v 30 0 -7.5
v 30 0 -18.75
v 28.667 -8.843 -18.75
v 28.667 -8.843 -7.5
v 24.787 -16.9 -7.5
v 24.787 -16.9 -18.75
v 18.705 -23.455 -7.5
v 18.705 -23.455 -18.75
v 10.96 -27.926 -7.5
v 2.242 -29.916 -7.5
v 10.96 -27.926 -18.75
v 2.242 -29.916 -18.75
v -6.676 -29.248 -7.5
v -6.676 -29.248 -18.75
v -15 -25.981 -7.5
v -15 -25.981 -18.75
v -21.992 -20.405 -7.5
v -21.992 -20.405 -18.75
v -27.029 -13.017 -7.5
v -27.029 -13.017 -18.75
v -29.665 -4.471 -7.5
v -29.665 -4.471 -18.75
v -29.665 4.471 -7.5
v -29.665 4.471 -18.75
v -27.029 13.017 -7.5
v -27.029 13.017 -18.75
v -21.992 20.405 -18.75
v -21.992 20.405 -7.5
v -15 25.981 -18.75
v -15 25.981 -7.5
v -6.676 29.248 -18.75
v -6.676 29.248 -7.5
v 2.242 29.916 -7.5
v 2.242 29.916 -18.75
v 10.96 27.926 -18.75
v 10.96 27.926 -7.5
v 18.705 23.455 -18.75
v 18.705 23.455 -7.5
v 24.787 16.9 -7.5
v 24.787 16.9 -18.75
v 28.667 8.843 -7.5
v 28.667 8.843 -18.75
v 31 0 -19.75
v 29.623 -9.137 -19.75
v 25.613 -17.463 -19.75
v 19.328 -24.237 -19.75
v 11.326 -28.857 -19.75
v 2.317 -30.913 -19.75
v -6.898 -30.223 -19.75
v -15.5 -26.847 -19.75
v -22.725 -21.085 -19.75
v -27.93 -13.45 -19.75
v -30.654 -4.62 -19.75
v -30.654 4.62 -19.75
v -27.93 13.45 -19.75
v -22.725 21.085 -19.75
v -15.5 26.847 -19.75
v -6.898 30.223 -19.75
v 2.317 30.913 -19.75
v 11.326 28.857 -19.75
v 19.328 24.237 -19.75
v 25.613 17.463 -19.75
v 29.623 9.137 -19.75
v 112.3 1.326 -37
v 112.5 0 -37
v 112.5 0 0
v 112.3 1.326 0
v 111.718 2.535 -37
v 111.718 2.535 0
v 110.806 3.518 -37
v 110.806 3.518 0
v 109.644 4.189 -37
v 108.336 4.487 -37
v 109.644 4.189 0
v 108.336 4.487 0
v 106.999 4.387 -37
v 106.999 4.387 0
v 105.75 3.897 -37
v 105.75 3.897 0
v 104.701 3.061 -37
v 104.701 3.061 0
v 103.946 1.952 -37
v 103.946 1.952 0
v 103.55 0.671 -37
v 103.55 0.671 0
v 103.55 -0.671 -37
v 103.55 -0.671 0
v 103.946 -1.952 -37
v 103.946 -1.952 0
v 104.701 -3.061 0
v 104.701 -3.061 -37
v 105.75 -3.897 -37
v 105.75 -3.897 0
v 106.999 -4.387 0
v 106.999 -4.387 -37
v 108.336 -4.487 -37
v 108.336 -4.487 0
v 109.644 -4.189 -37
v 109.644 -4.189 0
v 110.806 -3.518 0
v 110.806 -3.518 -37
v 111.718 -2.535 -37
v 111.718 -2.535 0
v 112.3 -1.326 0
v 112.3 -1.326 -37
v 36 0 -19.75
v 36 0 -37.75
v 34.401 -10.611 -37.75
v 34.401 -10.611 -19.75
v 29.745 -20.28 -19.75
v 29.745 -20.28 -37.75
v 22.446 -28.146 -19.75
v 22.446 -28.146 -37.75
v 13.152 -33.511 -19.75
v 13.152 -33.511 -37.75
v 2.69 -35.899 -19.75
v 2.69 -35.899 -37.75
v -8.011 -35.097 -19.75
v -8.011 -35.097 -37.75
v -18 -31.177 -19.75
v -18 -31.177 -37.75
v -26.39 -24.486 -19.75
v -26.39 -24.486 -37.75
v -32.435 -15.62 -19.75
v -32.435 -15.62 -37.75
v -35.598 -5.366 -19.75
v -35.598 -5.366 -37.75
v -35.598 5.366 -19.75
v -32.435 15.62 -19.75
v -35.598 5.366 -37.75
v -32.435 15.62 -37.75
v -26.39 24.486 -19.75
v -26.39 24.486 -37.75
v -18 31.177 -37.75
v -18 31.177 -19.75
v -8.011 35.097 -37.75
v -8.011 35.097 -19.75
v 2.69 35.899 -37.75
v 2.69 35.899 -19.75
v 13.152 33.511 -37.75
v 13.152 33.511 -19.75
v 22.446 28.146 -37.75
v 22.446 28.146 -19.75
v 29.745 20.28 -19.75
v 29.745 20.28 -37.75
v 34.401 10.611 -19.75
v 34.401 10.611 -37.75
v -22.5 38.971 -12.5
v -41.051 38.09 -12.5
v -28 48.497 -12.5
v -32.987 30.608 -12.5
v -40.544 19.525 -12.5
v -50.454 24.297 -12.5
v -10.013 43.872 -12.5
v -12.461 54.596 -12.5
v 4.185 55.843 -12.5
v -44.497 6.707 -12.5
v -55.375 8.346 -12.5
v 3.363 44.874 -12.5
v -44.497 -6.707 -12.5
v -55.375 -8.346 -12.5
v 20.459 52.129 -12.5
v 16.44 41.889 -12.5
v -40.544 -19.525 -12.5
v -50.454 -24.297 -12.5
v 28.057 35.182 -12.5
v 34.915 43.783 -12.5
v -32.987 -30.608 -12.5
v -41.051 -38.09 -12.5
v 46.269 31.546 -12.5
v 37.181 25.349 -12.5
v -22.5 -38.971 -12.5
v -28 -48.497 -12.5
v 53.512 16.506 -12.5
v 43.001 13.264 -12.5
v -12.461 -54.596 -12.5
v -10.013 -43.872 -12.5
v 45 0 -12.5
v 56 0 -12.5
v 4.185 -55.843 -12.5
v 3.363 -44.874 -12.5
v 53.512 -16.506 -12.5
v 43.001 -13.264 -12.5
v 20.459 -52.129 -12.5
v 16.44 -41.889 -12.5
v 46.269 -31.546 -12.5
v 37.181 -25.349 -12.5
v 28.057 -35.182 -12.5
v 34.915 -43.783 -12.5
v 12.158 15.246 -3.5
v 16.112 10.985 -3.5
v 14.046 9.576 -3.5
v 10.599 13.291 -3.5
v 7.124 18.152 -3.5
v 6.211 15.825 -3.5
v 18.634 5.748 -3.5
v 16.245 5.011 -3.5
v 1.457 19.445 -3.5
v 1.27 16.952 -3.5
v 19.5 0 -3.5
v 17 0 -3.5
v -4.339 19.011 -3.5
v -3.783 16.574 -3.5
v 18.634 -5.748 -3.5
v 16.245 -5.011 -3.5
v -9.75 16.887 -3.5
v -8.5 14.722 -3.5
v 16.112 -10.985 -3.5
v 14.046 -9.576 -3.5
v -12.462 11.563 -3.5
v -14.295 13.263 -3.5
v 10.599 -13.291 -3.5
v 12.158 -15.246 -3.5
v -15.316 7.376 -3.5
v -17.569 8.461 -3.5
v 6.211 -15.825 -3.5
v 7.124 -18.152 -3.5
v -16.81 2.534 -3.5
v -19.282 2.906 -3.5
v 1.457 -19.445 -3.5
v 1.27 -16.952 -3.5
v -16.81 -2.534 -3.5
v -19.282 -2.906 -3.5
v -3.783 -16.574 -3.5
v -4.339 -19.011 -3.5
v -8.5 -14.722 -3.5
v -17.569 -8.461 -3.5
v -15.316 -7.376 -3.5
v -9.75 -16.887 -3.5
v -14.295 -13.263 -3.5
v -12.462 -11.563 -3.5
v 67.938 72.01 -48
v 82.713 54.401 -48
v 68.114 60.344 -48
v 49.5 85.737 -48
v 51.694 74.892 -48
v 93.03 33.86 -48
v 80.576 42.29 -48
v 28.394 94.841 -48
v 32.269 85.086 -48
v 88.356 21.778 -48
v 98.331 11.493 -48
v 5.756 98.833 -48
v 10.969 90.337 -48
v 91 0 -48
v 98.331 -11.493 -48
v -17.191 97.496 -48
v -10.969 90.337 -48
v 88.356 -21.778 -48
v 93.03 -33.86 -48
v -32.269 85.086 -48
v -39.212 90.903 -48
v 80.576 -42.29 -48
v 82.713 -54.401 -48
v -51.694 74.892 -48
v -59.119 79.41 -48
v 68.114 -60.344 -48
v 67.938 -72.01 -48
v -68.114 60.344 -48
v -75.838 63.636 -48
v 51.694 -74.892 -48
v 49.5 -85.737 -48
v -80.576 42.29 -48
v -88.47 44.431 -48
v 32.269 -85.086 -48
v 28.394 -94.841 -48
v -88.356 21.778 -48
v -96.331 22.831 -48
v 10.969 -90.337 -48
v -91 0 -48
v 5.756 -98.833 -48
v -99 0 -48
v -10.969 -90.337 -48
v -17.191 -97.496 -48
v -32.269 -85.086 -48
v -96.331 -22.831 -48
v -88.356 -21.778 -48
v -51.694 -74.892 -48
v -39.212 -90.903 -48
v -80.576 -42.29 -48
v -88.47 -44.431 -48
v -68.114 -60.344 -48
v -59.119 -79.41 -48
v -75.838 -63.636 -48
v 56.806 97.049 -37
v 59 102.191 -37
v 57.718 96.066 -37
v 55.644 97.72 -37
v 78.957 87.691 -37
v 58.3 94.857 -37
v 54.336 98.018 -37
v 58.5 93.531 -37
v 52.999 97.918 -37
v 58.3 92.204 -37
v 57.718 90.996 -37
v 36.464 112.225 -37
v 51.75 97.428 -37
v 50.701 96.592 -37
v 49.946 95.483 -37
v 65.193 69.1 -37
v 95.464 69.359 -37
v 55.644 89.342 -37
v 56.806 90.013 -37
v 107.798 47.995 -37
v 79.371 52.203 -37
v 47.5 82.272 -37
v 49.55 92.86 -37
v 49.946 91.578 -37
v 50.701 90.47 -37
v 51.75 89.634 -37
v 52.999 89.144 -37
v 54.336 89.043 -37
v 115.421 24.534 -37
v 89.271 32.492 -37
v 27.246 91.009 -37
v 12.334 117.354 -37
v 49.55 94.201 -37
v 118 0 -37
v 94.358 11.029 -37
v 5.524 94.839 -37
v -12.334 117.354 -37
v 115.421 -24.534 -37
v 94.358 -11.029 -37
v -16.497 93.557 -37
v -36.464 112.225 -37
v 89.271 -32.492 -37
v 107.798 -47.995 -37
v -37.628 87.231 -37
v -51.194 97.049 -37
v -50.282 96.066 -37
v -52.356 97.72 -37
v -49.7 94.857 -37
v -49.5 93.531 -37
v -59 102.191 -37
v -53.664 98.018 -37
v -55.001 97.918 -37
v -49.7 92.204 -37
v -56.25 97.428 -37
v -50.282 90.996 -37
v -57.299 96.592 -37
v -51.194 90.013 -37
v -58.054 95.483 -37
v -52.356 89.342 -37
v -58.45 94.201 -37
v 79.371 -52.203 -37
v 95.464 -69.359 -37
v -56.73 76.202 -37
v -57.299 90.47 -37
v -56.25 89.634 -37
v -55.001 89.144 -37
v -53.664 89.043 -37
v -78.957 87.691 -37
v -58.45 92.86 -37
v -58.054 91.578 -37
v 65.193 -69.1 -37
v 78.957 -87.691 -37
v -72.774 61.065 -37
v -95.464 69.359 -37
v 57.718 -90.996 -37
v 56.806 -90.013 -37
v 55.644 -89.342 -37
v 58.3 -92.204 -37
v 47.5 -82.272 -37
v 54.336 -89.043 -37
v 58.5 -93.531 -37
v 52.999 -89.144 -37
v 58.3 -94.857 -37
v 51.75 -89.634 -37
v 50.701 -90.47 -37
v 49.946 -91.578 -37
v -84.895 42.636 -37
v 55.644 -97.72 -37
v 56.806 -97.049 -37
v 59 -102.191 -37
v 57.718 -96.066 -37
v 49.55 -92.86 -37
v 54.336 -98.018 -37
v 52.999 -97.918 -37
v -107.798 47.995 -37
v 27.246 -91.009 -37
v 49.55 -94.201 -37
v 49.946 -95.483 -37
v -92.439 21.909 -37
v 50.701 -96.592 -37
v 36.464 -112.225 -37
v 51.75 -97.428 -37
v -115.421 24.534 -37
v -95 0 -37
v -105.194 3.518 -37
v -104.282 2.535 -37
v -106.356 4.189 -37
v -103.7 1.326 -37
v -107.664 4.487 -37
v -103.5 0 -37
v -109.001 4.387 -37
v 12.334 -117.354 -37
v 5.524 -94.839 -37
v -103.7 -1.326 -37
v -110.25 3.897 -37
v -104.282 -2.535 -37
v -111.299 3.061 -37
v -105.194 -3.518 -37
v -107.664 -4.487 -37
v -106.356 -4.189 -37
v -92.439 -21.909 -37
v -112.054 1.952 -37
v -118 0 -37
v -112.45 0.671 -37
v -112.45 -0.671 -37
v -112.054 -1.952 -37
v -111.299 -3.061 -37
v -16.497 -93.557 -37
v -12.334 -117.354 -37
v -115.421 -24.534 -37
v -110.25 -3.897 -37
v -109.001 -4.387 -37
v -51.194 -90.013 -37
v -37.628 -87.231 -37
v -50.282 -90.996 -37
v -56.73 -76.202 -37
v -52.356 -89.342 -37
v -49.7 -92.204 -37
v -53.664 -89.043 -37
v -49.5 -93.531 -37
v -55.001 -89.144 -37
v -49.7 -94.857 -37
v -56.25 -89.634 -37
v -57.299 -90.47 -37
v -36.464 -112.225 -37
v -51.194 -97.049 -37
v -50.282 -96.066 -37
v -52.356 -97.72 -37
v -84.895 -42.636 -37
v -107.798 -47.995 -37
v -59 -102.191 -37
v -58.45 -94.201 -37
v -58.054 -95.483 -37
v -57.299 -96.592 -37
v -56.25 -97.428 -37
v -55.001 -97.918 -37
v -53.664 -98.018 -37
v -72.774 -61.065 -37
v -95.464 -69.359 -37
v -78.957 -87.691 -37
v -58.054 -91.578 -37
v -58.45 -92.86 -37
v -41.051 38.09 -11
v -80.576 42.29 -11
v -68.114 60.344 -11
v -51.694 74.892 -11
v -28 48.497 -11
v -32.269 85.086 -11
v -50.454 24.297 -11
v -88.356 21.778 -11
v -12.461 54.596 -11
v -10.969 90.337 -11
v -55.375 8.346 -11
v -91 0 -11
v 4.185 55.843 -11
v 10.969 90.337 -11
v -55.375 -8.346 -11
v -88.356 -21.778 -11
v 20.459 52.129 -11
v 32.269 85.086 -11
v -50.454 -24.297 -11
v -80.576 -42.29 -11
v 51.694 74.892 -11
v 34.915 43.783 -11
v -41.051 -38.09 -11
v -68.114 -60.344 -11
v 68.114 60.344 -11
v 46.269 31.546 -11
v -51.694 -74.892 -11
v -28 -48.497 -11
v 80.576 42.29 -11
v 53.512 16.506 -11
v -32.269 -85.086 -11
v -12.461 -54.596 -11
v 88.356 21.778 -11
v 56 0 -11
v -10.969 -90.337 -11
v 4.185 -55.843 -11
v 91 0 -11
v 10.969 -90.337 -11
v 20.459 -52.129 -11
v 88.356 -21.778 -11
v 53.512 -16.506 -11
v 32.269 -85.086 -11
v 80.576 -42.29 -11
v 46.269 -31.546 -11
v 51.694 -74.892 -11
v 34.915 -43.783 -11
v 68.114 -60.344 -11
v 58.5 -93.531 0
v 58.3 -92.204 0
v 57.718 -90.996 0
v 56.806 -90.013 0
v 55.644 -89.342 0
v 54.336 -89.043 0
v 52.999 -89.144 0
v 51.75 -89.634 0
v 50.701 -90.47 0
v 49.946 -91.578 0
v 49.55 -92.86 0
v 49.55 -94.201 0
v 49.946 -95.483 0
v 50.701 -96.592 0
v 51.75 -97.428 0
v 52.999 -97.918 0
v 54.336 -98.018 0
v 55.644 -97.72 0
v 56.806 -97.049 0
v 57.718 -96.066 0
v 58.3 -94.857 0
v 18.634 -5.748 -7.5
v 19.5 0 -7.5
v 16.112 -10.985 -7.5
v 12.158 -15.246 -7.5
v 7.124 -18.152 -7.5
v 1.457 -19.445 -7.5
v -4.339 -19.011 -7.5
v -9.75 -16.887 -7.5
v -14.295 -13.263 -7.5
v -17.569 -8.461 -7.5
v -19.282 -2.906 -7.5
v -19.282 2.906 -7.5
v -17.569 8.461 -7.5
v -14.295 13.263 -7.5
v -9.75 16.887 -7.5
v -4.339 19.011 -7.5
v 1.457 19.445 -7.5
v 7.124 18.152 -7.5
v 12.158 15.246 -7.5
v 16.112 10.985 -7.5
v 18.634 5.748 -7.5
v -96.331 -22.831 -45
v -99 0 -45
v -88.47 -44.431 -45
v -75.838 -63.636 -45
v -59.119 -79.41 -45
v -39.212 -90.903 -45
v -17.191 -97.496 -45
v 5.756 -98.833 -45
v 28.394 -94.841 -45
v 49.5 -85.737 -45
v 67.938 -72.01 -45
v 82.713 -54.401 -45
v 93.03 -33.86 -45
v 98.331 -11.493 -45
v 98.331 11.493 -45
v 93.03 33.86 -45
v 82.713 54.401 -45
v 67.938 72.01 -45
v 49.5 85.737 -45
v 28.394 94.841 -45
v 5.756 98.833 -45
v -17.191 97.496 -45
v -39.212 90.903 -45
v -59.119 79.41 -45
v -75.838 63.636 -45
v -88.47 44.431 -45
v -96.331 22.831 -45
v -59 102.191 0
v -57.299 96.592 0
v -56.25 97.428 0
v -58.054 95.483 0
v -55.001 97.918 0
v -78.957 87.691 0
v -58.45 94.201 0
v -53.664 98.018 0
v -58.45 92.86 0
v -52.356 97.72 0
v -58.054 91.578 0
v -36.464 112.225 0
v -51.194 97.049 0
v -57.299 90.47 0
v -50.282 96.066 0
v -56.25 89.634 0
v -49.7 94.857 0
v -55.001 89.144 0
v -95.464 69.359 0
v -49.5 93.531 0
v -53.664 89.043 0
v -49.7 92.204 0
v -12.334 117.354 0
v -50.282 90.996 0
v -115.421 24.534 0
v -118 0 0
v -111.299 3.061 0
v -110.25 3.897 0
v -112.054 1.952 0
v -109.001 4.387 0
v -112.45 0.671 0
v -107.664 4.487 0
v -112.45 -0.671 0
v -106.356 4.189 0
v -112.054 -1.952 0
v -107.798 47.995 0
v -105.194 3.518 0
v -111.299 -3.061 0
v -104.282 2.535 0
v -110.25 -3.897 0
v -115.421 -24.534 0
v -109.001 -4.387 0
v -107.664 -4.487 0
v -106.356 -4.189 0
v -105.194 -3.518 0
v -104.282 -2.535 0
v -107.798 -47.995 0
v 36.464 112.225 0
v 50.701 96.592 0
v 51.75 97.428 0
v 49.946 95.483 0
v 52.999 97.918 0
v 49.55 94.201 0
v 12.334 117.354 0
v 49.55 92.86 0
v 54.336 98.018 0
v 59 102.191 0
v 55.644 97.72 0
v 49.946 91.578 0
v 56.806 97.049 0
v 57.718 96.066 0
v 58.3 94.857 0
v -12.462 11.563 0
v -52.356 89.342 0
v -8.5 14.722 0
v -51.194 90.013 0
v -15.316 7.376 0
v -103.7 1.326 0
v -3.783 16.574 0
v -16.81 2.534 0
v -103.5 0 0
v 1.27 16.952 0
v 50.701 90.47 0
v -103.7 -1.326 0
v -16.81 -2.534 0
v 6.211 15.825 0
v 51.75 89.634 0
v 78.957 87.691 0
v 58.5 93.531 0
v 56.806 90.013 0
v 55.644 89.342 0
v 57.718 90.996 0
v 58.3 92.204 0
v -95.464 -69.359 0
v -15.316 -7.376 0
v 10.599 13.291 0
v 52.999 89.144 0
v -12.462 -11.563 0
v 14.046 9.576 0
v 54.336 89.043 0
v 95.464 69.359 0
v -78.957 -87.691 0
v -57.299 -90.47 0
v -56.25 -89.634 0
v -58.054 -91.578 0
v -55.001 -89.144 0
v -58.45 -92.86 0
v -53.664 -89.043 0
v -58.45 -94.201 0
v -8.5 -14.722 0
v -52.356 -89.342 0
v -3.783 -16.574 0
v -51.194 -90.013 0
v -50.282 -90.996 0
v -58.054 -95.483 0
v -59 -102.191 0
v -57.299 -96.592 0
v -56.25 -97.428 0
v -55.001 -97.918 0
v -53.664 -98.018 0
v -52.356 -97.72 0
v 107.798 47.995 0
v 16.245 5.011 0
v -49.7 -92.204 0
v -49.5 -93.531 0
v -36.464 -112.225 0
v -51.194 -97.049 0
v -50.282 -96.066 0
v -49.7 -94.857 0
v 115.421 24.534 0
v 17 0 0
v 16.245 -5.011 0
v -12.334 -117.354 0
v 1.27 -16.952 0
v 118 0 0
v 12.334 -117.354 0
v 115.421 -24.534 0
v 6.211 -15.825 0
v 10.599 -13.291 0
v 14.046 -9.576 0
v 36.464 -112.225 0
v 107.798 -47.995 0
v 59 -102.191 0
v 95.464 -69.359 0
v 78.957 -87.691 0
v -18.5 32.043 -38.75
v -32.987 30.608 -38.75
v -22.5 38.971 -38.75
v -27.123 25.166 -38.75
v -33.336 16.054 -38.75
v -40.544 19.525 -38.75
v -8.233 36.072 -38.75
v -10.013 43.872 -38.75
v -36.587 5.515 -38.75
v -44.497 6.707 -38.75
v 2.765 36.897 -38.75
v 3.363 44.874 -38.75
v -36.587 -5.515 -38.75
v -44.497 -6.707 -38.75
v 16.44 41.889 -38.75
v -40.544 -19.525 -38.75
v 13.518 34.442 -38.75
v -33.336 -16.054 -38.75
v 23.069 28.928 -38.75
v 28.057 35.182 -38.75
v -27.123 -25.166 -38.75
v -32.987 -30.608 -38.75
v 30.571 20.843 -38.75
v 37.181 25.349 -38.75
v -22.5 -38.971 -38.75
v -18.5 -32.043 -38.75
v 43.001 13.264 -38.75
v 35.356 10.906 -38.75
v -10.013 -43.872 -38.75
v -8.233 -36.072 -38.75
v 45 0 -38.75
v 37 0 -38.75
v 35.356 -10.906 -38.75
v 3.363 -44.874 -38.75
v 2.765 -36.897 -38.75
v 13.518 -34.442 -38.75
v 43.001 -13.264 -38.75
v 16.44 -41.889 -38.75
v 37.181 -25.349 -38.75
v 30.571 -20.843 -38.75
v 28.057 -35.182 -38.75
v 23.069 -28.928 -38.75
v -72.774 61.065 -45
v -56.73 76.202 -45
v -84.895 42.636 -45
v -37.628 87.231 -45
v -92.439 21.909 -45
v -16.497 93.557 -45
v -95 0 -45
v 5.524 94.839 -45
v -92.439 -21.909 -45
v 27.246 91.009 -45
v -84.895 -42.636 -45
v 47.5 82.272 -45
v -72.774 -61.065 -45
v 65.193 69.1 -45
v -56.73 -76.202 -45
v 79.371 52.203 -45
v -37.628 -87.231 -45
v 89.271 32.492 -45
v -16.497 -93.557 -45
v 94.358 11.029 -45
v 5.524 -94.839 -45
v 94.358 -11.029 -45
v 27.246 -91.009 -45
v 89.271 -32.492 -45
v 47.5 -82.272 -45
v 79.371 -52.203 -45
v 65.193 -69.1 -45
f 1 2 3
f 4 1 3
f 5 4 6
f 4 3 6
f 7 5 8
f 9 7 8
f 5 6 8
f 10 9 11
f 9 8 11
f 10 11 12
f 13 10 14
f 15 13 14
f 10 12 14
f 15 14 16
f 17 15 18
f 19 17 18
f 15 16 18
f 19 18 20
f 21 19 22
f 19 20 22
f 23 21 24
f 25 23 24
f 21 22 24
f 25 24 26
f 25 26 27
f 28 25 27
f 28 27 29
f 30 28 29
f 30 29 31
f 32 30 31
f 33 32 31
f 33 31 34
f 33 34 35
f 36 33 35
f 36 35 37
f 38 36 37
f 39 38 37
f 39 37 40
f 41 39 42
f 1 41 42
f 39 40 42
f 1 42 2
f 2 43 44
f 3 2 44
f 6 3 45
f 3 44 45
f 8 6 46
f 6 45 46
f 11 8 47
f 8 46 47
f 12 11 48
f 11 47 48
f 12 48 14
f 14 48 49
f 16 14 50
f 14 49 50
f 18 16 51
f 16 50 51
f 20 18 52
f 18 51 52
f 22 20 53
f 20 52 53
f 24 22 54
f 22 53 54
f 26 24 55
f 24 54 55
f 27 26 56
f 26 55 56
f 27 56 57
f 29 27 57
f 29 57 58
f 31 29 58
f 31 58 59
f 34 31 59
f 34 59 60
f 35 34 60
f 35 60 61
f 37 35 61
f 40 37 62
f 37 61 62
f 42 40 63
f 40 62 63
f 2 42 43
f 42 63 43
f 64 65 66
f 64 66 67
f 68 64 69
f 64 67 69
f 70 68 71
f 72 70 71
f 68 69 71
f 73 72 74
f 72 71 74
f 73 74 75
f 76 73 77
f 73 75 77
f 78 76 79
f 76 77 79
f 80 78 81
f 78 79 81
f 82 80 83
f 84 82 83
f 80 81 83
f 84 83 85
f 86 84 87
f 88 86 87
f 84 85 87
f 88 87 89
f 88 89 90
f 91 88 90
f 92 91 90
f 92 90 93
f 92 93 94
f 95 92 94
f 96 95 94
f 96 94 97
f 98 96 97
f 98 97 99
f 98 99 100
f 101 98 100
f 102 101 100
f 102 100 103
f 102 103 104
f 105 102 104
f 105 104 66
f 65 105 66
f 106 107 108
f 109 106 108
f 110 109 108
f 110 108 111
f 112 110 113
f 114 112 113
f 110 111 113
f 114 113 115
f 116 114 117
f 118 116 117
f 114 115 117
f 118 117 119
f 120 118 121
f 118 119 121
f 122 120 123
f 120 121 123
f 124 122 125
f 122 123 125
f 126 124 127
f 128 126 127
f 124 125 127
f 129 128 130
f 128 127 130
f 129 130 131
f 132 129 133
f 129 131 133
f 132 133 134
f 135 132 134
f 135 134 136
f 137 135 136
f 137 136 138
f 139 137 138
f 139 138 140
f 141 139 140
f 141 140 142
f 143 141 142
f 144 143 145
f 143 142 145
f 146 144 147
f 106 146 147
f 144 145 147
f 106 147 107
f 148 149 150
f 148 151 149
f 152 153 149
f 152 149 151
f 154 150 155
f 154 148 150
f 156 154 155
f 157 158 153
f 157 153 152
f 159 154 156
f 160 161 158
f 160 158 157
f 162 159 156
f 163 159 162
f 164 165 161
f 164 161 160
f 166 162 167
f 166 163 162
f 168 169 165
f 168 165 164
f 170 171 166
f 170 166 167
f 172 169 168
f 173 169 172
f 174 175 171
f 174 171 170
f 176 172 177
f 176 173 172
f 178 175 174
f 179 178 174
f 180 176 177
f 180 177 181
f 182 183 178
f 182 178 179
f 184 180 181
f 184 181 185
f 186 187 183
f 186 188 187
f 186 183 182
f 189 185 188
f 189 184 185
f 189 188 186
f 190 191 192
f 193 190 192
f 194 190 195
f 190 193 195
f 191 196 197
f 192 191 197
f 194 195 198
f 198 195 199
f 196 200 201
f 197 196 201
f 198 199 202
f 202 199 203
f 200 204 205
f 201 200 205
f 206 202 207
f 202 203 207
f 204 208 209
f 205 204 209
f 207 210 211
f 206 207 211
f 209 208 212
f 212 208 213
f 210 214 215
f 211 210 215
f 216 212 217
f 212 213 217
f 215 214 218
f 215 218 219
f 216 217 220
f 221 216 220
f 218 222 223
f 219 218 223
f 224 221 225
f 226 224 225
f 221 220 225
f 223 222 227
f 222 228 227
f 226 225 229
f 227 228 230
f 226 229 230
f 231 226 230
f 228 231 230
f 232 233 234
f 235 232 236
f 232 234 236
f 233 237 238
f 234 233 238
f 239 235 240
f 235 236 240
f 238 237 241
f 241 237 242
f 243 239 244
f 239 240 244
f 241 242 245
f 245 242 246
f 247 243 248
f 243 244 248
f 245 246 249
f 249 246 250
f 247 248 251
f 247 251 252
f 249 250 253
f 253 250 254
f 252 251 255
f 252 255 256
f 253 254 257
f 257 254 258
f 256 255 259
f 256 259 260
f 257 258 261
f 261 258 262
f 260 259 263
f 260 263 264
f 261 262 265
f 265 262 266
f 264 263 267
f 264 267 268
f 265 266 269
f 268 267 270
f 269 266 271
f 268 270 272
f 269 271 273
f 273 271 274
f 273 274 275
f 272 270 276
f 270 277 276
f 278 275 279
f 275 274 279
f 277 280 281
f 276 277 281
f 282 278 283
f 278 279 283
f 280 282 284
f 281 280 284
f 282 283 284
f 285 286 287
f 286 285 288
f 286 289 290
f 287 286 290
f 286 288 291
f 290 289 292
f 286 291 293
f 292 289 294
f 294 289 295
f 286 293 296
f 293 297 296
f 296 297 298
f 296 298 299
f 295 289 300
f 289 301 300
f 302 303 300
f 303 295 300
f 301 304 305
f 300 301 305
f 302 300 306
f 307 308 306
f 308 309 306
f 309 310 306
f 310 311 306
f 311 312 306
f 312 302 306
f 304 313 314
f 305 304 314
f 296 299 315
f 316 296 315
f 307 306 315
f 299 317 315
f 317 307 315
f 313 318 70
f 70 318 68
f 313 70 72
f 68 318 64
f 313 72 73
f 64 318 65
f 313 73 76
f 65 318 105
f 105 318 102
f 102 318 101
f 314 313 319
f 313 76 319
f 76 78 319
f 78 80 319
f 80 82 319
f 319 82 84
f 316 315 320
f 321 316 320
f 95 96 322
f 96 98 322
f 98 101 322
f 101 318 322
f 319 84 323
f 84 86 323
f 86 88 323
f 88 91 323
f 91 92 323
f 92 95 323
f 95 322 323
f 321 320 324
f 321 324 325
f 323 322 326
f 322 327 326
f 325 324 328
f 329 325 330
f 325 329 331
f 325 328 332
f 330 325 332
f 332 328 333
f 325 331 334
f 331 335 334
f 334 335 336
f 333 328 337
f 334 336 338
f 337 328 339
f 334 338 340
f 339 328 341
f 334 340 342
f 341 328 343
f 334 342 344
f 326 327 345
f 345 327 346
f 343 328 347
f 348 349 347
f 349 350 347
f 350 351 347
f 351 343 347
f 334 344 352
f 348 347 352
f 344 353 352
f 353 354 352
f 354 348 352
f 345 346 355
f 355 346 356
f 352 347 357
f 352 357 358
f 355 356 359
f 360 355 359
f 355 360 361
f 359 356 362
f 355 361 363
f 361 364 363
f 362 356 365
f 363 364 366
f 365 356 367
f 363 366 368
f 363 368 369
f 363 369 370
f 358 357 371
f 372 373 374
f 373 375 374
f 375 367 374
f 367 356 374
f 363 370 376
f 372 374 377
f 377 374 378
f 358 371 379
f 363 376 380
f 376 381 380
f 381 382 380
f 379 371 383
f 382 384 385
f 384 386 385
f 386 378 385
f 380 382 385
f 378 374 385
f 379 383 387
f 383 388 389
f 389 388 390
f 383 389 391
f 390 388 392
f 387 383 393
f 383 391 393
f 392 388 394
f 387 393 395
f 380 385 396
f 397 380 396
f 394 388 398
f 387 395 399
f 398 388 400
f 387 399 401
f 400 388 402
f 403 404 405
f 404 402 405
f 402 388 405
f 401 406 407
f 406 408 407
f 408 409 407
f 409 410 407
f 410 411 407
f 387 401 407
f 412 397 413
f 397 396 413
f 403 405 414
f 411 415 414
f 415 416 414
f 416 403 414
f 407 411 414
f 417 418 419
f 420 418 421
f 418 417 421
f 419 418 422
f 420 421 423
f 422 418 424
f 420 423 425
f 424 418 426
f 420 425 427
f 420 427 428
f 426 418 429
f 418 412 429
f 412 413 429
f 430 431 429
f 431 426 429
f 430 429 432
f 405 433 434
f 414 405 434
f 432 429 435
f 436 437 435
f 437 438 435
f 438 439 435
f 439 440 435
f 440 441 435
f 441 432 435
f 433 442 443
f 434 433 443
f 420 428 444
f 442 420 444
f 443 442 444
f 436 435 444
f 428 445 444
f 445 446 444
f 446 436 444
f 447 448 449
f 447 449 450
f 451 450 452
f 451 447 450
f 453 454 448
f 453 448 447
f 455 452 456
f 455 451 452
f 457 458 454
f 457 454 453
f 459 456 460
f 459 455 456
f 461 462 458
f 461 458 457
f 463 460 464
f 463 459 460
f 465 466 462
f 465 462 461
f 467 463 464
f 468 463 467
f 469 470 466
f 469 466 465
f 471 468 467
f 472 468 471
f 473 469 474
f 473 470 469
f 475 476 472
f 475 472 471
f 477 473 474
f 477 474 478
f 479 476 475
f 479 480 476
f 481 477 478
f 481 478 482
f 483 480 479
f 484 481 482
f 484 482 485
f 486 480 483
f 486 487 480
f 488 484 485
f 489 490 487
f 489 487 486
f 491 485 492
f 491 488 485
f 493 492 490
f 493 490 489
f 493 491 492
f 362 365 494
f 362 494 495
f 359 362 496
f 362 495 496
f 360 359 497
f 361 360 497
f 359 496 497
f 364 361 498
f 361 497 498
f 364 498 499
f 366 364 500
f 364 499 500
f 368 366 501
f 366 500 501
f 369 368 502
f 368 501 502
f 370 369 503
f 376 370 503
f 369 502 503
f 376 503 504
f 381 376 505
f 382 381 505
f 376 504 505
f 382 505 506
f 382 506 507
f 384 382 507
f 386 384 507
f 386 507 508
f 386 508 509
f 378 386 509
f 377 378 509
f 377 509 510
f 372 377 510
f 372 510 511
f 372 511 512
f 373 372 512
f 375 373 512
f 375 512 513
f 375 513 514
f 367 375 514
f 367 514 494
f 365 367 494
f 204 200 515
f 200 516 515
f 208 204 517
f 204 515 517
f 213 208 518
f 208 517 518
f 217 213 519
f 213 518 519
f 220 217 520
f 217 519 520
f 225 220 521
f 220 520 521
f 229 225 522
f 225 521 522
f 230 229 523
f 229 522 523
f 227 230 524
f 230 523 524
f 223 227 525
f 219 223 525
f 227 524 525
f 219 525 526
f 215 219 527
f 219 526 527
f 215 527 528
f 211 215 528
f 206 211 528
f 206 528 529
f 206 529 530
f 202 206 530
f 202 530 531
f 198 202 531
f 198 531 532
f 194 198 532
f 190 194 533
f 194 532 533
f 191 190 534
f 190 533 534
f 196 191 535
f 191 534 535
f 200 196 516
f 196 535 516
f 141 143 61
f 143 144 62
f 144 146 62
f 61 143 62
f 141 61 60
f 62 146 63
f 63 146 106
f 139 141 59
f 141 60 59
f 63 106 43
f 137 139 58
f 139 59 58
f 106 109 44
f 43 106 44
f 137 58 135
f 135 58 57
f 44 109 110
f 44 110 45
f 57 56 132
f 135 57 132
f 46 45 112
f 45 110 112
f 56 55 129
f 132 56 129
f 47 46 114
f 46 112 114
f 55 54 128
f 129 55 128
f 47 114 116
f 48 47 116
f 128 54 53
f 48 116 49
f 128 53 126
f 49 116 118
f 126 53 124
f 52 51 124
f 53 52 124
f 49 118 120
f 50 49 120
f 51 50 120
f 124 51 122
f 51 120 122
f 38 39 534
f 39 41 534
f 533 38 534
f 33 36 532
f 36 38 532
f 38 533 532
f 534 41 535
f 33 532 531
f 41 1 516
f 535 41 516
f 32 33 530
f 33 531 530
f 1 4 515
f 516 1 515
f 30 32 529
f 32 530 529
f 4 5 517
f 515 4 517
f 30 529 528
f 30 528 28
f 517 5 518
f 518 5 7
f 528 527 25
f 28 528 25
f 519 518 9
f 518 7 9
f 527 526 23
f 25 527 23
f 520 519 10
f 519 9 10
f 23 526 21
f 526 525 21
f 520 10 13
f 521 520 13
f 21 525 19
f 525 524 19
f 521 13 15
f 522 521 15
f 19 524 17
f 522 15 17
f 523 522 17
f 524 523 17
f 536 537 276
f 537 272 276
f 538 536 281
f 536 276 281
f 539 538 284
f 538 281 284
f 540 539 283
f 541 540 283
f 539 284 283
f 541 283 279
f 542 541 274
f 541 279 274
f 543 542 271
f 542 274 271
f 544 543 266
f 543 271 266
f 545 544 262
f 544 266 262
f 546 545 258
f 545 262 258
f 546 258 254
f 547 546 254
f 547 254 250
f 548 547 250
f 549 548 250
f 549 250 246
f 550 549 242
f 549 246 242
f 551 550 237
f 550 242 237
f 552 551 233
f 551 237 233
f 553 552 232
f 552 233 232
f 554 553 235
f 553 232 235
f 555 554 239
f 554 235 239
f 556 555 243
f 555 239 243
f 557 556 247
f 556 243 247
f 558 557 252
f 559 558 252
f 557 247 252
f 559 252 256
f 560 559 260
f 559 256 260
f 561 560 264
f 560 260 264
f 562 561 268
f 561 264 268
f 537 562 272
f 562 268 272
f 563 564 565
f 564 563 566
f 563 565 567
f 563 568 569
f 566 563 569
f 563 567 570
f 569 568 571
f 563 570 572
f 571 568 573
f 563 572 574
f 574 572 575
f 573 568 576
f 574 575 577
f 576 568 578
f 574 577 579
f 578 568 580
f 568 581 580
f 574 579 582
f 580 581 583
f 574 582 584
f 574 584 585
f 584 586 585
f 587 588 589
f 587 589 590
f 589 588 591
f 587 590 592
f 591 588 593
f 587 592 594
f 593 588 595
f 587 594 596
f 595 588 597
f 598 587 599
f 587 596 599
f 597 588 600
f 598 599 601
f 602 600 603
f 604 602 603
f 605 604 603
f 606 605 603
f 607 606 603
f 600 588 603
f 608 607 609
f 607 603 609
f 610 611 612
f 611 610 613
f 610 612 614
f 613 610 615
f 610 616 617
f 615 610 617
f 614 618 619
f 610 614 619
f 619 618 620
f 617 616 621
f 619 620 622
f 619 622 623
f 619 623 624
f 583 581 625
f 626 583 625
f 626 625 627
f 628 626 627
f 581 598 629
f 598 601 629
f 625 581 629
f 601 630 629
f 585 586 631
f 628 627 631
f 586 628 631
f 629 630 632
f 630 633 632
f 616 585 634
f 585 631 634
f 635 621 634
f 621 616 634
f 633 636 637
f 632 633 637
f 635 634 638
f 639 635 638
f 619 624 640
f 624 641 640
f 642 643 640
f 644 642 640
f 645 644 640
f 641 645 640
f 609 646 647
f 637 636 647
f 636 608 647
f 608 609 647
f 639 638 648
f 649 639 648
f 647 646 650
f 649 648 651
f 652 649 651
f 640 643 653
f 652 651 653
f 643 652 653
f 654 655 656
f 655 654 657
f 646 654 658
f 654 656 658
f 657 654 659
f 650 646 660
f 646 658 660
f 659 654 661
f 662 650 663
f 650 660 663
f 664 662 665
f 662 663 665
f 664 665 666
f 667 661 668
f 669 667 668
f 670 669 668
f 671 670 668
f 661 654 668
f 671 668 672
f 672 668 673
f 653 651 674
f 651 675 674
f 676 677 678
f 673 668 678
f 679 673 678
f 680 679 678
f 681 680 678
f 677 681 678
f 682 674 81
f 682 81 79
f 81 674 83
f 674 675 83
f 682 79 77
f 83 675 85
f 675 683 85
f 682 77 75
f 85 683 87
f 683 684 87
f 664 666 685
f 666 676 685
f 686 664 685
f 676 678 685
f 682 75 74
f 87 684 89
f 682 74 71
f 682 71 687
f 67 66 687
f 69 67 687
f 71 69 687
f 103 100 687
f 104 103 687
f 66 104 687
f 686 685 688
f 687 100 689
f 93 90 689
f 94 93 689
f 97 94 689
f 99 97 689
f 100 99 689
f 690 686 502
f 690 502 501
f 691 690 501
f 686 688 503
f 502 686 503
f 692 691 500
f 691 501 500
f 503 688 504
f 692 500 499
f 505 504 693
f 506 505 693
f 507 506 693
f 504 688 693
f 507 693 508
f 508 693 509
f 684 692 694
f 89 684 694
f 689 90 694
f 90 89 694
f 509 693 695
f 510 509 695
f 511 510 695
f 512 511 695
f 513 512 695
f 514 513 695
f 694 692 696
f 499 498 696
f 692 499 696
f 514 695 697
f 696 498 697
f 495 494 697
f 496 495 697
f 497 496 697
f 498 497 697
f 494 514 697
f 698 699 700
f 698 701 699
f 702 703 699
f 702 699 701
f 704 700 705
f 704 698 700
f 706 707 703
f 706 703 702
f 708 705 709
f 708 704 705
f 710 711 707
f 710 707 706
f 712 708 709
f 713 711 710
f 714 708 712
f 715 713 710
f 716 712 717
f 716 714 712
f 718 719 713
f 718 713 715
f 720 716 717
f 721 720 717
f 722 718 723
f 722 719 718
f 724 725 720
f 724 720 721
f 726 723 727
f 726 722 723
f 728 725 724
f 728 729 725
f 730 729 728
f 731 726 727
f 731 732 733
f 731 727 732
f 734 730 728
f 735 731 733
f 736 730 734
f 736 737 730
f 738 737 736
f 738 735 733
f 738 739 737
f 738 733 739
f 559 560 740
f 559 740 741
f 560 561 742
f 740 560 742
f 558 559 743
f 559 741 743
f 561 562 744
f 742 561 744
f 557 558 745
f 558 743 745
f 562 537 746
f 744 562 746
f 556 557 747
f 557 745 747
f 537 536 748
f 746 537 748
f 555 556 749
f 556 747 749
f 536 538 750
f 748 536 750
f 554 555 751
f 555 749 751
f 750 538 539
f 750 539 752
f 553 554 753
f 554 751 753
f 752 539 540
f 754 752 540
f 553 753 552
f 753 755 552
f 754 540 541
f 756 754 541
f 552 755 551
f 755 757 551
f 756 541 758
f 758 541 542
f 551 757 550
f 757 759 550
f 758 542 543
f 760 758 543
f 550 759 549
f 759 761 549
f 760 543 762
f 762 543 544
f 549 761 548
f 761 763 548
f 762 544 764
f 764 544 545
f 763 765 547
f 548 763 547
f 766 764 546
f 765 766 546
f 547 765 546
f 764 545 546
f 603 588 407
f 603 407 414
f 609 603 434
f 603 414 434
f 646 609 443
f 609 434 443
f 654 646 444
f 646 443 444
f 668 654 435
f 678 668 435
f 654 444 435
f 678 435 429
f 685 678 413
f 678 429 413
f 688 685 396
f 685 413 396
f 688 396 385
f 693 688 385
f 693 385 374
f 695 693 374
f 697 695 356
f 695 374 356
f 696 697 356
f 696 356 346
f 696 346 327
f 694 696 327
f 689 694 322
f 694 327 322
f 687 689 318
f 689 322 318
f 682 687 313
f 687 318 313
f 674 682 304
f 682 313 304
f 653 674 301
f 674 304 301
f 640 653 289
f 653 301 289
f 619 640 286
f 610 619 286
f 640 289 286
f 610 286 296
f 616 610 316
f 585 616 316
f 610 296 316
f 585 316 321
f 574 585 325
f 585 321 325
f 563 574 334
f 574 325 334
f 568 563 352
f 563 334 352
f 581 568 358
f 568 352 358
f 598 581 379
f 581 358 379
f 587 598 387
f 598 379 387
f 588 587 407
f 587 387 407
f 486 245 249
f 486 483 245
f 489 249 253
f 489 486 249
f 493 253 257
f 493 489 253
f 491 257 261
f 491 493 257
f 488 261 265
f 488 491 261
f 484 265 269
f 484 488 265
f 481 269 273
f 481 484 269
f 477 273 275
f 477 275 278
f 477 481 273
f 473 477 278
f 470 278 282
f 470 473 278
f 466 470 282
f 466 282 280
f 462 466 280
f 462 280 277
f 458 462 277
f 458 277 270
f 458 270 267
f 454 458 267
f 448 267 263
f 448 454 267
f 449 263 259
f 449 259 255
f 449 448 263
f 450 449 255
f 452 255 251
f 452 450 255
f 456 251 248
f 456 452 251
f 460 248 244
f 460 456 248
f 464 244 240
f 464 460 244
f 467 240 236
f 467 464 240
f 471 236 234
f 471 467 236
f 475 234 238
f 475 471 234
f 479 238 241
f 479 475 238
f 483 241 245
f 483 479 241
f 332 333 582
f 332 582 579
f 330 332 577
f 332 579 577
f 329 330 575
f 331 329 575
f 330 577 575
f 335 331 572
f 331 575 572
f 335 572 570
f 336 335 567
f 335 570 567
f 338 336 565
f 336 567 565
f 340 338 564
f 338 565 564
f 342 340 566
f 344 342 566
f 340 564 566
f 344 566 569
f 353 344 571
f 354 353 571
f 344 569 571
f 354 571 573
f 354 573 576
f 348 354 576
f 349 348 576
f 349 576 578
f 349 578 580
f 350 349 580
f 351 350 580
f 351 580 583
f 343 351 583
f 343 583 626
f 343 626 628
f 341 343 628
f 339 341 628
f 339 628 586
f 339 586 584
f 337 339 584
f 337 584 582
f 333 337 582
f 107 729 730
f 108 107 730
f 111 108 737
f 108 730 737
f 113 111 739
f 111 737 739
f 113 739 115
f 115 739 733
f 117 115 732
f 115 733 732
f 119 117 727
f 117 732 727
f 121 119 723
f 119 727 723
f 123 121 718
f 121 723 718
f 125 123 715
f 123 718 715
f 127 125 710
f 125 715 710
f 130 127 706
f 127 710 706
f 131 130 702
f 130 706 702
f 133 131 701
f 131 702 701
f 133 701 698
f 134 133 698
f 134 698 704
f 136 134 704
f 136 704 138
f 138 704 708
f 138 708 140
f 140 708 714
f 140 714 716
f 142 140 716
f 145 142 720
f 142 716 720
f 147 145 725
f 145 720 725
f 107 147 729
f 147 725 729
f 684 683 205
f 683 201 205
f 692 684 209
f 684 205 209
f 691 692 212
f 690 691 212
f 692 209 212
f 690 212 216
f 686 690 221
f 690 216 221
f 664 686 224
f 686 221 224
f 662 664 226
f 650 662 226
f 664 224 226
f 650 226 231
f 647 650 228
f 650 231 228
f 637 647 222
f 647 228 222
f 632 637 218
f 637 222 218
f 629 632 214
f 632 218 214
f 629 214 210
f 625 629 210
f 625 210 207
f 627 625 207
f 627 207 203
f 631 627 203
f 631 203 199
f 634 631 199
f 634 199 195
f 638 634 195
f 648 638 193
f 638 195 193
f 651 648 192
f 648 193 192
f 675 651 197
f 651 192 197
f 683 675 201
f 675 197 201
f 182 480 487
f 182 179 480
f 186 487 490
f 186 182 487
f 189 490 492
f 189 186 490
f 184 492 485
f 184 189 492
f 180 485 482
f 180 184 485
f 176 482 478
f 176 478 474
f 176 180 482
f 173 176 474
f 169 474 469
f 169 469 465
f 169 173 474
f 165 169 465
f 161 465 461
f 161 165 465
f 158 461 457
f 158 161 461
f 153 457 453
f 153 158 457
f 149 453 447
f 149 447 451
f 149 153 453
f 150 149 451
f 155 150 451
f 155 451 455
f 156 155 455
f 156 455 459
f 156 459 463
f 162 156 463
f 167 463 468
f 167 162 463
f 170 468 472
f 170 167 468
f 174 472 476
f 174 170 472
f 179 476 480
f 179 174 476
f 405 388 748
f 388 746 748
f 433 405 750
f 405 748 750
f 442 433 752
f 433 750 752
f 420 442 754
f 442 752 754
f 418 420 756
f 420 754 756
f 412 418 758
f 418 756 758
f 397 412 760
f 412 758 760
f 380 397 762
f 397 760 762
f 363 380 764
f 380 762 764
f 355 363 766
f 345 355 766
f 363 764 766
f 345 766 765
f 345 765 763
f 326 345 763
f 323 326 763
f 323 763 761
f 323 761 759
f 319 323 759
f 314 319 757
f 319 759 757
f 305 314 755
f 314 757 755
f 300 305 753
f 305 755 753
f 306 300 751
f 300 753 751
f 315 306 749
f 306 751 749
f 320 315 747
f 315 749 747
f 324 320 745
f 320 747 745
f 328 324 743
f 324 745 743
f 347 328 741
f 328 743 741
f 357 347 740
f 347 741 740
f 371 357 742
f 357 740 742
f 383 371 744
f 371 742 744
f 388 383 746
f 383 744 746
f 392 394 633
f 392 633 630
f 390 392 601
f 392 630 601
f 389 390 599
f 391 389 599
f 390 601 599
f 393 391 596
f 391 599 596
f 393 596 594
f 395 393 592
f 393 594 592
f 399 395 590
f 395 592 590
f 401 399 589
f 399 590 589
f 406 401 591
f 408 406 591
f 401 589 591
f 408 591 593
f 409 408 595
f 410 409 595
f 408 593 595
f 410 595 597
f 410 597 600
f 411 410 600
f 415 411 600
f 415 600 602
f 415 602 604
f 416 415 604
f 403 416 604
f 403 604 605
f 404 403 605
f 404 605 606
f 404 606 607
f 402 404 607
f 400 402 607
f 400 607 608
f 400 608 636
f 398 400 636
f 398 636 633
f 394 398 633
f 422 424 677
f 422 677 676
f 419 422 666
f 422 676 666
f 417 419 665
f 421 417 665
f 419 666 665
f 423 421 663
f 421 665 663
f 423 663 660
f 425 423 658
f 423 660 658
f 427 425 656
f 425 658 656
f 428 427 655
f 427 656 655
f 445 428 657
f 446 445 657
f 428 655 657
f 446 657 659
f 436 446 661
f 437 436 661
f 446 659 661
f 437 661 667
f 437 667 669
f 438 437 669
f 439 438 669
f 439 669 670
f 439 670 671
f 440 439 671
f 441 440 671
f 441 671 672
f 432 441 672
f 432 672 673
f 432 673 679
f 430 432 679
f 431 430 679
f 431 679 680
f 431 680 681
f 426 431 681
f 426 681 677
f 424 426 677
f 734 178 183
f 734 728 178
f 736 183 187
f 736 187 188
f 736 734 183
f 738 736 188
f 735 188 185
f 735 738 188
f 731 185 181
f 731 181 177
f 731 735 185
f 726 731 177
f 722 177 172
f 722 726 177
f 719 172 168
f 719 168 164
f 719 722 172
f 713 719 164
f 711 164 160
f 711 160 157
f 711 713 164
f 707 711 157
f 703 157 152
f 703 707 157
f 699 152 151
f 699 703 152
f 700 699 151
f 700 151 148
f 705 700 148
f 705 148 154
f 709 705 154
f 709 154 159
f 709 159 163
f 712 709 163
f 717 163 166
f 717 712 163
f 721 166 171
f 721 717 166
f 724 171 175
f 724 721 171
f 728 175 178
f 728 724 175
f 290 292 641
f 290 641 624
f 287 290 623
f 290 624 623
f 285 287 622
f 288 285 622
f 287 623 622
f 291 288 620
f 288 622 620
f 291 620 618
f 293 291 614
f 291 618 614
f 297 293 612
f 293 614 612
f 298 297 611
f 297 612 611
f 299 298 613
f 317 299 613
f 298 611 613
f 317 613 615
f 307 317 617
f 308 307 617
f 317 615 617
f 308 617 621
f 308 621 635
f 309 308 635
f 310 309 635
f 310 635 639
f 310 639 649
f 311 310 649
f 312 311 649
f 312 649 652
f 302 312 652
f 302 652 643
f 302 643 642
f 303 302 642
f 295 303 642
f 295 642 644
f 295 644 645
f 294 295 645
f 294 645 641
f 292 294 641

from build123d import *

# Parameters (mm, degrees)
HOLE_WIZARD_1_D = 9
CHAMFER_1_SIZE  = 1


with BuildPart() as part:
    # 草图1 → 旋转1 (revolve)
    with BuildSketch(Plane(origin=(0, 0, 0), x_dir=(0, 0, -1), z_dir=(1, 0, 0)), mode=Mode.PRIVATE) as revolve_1_sk:
        Polygon((0, 0), (0, 118), (37, 118), (37, 95), (45, 95), (45, 99), (48, 99), (48, 0), align=None)
    revolve(revolve_1_sk.sketch.rotate(Axis((0, 0, -48), (0, 0, 1)), 90), axis=Axis((0, 0, -48), (0, 0, 1)))

    # 草图2 → 切除-旋转1 (revolve, cut)
    with BuildSketch(Plane(origin=(0, 0, 0), x_dir=(0, 0, -1), z_dir=(1, 0, 0)), mode=Mode.PRIVATE) as cut_revolve_1_sk:
        Polygon((48, 0), (48, 91), (11, 91), (11, 56), (12.5, 56), (12.5, 45), (38.75, 45), (38.75, 0), align=None)
    revolve(cut_revolve_1_sk.sketch.rotate(Axis((0, 0, 0), (0, 0, -1)), 90), axis=Axis((0, 0, 0), (0, 0, -1)), mode=Mode.SUBTRACT)

    # 草图3 → 切除-旋转2 (revolve, cut)
    with BuildSketch(Plane(origin=(0, 0, 0), x_dir=(0, 0, -1), z_dir=(1, 0, 0)), mode=Mode.PRIVATE) as cut_revolve_2_sk:
        Polygon((0, 0), (0, 17), (3.5, 17), (3.5, 19.5), (7.5, 19.5), (7.5, 30), (19.75, 30), (19.75, 36), (38.75, 36), (38.75, 0), align=None)
    revolve(cut_revolve_2_sk.sketch.rotate(Axis((0, 0, 0), (0, 0, -1)), 90), axis=Axis((0, 0, 0), (0, 0, -1)), mode=Mode.SUBTRACT)

    # 孔1 (through all)
    with Locations(Plane(origin=(0, 0, -37), x_dir=(-1, 0, 0), z_dir=(0, 0, -1))):
        with Locations((54, 93.530743609), (108, 0), (54, -93.530743609), (-54, -93.530743609), (-108, 0), (-54, 93.530743609)):
            Hole(HOLE_WIZARD_1_D / 2)

    # 倒角1
    chamfer_1_edges = [part.edges().sort_by_distance(p)[0] for p in [
        (-30, 0, -19.75),
        (-36, 0, -38.75),
    ]]
    chamfer(chamfer_1_edges, length=CHAMFER_1_SIZE)


solid = part.part
